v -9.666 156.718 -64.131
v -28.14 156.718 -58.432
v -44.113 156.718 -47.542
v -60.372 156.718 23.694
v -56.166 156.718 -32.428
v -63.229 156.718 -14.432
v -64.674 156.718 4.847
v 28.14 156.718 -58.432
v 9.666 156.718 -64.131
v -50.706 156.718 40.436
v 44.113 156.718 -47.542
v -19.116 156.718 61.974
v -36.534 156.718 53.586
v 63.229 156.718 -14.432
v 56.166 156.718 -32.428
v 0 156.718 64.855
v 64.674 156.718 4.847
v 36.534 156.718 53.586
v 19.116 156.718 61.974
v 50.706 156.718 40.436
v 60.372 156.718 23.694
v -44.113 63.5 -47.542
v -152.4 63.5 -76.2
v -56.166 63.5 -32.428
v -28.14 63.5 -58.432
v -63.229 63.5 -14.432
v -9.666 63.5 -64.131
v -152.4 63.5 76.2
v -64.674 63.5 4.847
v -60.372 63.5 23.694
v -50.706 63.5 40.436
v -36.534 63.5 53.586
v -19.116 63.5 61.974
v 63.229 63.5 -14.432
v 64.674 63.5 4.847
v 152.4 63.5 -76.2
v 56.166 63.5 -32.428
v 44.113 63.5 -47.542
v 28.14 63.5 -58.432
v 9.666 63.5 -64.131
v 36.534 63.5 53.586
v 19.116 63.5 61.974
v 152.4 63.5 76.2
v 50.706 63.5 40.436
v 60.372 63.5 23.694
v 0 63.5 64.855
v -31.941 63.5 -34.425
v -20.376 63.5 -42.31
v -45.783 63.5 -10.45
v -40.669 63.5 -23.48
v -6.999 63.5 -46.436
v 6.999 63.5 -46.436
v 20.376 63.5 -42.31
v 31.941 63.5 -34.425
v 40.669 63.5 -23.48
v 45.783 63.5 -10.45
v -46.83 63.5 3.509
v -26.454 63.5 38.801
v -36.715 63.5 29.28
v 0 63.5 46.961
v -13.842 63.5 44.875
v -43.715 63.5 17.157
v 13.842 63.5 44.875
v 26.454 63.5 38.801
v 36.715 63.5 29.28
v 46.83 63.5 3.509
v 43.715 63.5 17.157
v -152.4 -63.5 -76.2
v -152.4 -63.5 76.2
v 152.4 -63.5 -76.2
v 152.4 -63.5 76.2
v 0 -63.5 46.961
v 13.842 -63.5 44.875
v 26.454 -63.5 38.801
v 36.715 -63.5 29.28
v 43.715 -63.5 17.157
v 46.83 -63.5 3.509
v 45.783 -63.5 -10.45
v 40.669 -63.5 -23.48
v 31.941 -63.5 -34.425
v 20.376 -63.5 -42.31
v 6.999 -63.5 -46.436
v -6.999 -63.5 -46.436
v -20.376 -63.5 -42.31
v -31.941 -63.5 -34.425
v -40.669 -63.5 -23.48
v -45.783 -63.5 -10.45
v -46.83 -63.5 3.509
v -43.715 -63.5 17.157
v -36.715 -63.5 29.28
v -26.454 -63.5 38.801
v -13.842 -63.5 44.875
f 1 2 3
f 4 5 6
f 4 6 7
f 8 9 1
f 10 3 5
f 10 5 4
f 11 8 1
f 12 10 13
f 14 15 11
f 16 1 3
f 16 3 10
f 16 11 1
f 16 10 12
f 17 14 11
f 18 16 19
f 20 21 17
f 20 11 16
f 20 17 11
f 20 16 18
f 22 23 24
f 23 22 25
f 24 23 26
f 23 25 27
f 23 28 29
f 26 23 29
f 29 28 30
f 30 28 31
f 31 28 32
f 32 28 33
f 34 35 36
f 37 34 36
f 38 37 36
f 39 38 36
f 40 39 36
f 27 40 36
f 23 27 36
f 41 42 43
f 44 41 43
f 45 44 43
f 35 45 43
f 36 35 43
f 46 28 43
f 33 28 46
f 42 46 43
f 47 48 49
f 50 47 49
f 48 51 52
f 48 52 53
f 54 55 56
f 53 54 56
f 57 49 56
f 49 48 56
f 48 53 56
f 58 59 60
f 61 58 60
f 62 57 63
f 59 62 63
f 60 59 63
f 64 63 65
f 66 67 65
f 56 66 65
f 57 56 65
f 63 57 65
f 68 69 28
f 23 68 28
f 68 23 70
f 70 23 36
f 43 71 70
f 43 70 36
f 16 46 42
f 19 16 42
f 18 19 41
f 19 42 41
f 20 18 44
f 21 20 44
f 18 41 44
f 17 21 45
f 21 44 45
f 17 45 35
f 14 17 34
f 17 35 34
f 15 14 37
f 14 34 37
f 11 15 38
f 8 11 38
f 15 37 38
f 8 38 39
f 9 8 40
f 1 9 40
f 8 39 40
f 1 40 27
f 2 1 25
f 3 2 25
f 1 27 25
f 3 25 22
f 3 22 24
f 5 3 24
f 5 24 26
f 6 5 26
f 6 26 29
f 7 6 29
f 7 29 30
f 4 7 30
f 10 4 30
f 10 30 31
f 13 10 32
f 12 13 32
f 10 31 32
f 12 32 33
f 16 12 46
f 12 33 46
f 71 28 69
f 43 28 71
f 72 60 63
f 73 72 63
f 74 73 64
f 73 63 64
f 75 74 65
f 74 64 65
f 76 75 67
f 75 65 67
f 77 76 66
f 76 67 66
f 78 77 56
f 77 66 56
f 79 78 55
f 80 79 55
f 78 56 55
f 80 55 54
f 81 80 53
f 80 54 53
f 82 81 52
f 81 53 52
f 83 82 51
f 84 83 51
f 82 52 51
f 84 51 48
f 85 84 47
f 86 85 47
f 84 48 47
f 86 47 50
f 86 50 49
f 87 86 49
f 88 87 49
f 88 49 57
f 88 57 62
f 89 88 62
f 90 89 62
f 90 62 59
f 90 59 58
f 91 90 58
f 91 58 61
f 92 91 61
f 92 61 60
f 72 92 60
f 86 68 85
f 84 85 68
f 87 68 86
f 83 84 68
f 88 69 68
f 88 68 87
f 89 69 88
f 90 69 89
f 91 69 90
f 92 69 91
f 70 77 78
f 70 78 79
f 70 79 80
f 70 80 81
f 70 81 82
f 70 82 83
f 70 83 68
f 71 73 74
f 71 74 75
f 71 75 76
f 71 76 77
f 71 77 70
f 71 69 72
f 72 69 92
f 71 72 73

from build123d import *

# Parameters (mm, degrees)
SKETCH1_W           = 304.8
SKETCH1_H           = 127
BOSS_EXTRUDE1_DEPTH = 76.2
SKETCH4_R           = 46.960856135
CUT_EXTRUDE3_DEPTH  = 213.51164674
SKETCH5_R           = 64.855004159
BOSS_EXTRUDE2_DEPTH = 93.218


with BuildPart() as part:
    # Sketch1 → Boss-Extrude1 (new, symmetric)
    with BuildSketch(Plane.XY):
        Rectangle(SKETCH1_W, SKETCH1_H)
    extrude(amount=BOSS_EXTRUDE1_DEPTH, both=True)

    # Sketch4 → Cut-Extrude3 (cut, through all)
    with BuildSketch(Plane(origin=(0, 63.5, 0), x_dir=(1, 0, 0), z_dir=(0, 1, 0))):
        with Locations(Location((0, 0, 0), (0, 0, 270))):
            Circle(SKETCH4_R)
    extrude(amount=-CUT_EXTRUDE3_DEPTH, mode=Mode.SUBTRACT)

    # Sketch5 → Boss-Extrude2 (add)
    with BuildSketch(Plane(origin=(0, 63.5, 0), x_dir=(1, 0, 0), z_dir=(0, 1, 0))):
        with Locations(Location((0, 0, 0), (0, 0, 270))):
            Circle(SKETCH5_R)
    extrude(amount=BOSS_EXTRUDE2_DEPTH)


solid = part.part
